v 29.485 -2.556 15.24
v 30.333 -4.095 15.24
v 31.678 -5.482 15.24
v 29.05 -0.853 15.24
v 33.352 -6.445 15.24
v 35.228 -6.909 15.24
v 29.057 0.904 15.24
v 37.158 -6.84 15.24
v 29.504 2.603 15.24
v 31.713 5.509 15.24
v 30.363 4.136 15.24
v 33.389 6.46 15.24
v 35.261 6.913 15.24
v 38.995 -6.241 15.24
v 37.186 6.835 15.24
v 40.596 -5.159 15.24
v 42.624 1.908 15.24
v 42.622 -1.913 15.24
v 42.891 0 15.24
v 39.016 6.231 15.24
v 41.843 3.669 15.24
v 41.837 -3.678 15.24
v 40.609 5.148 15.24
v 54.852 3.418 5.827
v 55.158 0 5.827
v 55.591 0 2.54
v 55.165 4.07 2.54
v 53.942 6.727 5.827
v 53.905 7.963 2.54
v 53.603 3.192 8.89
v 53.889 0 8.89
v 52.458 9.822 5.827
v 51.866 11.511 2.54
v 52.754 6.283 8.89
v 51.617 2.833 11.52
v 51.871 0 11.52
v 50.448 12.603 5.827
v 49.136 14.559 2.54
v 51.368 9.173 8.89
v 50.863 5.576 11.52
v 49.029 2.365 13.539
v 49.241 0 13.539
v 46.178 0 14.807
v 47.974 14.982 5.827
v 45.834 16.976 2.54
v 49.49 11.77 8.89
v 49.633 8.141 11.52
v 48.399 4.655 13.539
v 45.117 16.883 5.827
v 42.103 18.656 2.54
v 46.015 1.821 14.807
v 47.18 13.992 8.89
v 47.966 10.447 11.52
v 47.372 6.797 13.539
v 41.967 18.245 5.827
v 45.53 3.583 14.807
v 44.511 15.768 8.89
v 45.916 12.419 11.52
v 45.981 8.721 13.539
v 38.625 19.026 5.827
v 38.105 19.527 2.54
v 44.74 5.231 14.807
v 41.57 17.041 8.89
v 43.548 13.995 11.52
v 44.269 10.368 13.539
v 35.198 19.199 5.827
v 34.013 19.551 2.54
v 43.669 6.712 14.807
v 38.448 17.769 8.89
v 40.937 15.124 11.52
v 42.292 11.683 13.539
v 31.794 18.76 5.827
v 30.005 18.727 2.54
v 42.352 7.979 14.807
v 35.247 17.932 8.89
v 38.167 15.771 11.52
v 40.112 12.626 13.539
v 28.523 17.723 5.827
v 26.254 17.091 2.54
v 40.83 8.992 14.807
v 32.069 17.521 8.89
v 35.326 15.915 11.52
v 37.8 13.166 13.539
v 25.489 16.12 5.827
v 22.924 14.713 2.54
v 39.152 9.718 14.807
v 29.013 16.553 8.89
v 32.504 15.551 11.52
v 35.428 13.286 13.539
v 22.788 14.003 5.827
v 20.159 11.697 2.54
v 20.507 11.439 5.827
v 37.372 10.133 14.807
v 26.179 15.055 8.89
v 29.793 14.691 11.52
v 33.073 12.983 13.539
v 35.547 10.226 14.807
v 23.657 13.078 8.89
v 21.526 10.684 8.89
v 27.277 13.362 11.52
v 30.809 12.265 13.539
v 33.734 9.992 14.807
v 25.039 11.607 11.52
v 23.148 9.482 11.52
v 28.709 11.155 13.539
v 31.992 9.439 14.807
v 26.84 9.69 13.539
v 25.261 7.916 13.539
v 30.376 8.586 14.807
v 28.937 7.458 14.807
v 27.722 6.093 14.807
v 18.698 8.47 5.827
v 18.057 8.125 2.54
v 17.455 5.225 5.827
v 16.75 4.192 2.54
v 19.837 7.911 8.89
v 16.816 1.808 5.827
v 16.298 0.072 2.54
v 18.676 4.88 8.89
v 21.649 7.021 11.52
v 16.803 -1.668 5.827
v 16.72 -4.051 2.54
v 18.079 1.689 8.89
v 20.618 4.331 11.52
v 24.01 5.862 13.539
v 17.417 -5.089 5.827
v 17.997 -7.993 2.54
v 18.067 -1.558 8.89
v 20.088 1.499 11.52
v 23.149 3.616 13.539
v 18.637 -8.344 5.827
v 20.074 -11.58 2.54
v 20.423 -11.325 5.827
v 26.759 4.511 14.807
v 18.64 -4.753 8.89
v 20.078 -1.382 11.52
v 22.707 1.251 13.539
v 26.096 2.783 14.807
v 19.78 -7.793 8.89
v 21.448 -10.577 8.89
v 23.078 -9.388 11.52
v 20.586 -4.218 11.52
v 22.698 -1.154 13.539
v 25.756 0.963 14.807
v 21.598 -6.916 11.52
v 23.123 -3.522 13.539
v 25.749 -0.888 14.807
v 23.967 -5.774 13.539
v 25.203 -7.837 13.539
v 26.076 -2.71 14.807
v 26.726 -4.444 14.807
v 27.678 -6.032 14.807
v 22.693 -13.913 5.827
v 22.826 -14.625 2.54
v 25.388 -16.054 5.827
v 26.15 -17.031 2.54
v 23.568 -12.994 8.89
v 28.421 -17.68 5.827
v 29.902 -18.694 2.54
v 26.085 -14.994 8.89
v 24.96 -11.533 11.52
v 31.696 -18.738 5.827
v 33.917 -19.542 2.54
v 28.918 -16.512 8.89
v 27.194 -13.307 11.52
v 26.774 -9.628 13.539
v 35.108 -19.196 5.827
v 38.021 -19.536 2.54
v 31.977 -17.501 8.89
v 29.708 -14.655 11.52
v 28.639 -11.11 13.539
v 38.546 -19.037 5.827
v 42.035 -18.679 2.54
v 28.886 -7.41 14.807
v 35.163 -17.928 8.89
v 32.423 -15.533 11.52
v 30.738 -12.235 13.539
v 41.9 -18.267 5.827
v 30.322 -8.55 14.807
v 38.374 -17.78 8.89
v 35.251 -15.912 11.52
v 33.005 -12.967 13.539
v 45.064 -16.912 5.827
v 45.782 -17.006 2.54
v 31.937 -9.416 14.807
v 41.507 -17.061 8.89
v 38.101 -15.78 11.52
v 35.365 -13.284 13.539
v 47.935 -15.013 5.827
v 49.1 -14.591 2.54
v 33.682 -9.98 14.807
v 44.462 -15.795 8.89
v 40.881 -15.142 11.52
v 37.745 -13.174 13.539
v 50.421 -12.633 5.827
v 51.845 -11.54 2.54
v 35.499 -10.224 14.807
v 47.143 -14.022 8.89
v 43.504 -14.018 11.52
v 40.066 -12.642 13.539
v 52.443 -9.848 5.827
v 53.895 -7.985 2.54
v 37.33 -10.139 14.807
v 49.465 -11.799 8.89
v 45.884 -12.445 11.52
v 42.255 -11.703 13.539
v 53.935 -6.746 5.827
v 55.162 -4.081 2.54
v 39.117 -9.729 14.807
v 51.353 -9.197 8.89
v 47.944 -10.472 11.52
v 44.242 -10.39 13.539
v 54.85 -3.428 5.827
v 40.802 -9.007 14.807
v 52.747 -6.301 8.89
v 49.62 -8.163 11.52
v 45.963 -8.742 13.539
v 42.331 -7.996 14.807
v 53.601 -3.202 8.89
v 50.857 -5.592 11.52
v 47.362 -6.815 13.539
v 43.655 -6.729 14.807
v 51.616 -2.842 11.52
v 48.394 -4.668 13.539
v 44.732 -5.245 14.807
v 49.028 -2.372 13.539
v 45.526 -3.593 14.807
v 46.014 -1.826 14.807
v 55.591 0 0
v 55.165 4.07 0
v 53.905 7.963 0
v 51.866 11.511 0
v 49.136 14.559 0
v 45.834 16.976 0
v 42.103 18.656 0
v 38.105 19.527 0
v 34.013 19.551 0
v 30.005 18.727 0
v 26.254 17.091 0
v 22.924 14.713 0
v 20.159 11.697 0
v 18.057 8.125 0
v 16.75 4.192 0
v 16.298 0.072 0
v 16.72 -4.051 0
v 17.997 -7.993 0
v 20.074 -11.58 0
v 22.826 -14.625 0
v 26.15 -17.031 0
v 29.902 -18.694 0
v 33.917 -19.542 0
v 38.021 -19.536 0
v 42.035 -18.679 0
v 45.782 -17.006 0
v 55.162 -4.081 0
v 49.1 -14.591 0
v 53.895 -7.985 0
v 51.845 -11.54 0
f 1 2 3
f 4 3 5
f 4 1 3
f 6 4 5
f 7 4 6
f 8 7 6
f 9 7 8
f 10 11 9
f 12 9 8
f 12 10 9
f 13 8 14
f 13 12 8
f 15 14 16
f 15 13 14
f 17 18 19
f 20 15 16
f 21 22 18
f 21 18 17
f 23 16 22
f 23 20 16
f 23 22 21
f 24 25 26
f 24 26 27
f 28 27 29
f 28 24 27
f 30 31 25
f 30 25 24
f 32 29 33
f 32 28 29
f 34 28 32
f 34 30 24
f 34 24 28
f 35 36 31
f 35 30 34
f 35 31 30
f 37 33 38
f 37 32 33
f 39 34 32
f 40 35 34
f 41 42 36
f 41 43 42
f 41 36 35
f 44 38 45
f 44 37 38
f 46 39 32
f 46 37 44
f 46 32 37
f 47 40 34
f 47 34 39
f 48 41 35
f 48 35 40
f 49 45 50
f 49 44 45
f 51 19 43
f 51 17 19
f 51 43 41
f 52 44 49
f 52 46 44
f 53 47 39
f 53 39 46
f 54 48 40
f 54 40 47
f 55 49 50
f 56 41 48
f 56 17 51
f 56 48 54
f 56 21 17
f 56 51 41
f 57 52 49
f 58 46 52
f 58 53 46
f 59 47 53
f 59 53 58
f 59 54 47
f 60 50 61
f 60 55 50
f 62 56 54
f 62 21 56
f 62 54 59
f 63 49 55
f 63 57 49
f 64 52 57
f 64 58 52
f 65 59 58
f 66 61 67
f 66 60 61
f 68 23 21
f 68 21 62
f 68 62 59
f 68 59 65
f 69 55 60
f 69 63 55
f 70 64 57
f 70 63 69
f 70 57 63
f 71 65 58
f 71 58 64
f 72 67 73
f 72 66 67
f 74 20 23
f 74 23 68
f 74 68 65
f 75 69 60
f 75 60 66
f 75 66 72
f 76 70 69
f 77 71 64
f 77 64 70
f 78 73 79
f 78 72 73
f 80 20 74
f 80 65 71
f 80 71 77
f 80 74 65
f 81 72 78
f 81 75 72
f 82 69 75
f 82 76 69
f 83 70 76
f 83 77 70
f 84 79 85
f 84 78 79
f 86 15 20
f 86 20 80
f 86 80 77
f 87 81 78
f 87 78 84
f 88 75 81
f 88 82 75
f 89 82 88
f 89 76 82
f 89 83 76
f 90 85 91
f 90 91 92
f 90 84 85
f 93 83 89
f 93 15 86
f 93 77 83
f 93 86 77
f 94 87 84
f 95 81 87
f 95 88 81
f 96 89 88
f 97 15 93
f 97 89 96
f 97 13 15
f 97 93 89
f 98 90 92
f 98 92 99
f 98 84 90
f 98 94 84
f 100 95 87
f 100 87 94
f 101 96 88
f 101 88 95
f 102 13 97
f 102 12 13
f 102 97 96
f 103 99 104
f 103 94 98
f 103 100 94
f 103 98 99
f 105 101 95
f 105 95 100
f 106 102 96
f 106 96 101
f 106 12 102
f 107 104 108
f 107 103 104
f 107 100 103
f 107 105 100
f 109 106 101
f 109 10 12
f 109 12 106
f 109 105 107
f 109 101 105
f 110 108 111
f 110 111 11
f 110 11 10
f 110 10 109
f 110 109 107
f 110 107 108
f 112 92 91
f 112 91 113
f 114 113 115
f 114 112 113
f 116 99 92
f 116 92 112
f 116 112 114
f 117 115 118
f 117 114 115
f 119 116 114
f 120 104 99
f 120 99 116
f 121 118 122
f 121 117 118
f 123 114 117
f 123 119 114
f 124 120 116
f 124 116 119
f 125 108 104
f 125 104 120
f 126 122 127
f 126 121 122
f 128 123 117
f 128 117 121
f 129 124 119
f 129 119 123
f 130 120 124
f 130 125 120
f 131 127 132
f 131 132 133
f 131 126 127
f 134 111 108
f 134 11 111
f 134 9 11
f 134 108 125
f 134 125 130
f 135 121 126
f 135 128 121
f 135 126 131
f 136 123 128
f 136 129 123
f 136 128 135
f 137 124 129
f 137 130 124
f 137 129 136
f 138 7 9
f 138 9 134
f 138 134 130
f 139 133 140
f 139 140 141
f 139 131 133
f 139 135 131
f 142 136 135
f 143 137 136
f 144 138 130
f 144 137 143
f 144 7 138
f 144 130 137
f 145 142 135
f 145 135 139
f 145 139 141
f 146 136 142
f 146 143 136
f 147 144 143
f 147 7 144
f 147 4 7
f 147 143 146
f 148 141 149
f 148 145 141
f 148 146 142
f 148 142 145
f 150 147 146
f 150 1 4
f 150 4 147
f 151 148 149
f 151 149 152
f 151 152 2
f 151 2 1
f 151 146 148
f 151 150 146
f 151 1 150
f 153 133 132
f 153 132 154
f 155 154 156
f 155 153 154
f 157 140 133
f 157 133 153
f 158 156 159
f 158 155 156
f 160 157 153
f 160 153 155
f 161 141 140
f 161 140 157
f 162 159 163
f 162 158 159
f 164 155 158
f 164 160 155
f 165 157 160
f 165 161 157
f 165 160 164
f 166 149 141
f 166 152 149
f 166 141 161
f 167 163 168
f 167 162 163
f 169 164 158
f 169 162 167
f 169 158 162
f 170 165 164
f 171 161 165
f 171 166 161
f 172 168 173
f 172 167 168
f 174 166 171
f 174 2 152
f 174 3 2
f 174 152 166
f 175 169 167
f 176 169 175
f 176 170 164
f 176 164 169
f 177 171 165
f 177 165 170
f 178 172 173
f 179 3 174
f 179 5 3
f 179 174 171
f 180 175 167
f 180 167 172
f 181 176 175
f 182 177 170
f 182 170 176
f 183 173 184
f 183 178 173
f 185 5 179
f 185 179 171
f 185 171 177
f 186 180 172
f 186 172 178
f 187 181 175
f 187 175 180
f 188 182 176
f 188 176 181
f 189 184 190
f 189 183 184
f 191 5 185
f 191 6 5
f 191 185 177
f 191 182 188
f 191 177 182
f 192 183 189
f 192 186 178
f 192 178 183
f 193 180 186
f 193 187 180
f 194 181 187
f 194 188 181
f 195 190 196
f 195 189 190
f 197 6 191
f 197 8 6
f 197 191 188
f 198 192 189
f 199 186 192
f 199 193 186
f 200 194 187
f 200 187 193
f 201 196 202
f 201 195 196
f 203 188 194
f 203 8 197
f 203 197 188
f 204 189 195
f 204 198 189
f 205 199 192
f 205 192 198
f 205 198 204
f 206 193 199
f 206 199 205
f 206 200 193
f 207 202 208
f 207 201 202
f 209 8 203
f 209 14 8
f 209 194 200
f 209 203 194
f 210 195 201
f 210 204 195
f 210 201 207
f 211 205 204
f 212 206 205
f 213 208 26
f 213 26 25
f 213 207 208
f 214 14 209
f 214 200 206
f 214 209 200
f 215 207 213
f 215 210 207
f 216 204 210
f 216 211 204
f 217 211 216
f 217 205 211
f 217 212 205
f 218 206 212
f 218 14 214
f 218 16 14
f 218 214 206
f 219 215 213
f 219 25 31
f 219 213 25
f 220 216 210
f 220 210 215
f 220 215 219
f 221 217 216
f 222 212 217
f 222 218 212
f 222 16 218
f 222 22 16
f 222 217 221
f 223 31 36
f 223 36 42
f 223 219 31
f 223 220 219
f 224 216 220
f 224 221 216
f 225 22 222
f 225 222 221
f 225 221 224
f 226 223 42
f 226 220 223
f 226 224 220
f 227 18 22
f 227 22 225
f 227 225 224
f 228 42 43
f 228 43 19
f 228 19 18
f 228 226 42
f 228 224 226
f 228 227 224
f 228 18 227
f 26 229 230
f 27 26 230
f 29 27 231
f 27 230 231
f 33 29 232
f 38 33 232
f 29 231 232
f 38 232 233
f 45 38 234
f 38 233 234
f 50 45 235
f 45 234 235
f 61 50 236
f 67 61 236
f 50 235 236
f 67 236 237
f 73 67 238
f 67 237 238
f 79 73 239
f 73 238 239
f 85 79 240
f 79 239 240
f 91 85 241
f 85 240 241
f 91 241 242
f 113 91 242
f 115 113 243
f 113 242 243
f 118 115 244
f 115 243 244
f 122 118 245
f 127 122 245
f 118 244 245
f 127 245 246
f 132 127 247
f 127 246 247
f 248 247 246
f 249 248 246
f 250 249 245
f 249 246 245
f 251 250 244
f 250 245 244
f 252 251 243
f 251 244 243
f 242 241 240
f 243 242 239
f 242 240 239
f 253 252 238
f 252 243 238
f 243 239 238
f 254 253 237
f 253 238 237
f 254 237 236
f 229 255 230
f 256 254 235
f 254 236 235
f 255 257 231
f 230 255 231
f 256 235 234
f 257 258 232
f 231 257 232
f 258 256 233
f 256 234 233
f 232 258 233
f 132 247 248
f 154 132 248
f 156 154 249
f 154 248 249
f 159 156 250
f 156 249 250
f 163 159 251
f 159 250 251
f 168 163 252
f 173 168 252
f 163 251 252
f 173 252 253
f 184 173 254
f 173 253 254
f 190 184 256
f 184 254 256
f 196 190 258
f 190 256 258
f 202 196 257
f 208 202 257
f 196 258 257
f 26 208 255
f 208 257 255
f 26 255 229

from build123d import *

# Parameters (mm, degrees)
F1_DEPTH = 15.24
F2_R     = 12.7


with BuildPart() as f1:
    # F0 (on Top) → F1 (new body)
    with BuildSketch(Plane.XY):
        with BuildLine():
            ThreePointArc((20.073606, -11.580395), (42.034545, -18.678742), (55.590871, 0))
            ThreePointArc((55.590871, 0), (42.103027, 18.656274), (20.158998, 11.696525))
            ThreePointArc((20.158998, 11.696525), (16.297954, 0.072073), (20.073606, -11.580395))
        make_face()
    extrude(amount=F1_DEPTH)

    # F2
    f2_edges = [f1.edges().sort_by_distance(p)[0] for p in [
        (51.729694, -11.696525, 15.24),
    ]]
    fillet(f2_edges, radius=F2_R)


solid = f1.part
